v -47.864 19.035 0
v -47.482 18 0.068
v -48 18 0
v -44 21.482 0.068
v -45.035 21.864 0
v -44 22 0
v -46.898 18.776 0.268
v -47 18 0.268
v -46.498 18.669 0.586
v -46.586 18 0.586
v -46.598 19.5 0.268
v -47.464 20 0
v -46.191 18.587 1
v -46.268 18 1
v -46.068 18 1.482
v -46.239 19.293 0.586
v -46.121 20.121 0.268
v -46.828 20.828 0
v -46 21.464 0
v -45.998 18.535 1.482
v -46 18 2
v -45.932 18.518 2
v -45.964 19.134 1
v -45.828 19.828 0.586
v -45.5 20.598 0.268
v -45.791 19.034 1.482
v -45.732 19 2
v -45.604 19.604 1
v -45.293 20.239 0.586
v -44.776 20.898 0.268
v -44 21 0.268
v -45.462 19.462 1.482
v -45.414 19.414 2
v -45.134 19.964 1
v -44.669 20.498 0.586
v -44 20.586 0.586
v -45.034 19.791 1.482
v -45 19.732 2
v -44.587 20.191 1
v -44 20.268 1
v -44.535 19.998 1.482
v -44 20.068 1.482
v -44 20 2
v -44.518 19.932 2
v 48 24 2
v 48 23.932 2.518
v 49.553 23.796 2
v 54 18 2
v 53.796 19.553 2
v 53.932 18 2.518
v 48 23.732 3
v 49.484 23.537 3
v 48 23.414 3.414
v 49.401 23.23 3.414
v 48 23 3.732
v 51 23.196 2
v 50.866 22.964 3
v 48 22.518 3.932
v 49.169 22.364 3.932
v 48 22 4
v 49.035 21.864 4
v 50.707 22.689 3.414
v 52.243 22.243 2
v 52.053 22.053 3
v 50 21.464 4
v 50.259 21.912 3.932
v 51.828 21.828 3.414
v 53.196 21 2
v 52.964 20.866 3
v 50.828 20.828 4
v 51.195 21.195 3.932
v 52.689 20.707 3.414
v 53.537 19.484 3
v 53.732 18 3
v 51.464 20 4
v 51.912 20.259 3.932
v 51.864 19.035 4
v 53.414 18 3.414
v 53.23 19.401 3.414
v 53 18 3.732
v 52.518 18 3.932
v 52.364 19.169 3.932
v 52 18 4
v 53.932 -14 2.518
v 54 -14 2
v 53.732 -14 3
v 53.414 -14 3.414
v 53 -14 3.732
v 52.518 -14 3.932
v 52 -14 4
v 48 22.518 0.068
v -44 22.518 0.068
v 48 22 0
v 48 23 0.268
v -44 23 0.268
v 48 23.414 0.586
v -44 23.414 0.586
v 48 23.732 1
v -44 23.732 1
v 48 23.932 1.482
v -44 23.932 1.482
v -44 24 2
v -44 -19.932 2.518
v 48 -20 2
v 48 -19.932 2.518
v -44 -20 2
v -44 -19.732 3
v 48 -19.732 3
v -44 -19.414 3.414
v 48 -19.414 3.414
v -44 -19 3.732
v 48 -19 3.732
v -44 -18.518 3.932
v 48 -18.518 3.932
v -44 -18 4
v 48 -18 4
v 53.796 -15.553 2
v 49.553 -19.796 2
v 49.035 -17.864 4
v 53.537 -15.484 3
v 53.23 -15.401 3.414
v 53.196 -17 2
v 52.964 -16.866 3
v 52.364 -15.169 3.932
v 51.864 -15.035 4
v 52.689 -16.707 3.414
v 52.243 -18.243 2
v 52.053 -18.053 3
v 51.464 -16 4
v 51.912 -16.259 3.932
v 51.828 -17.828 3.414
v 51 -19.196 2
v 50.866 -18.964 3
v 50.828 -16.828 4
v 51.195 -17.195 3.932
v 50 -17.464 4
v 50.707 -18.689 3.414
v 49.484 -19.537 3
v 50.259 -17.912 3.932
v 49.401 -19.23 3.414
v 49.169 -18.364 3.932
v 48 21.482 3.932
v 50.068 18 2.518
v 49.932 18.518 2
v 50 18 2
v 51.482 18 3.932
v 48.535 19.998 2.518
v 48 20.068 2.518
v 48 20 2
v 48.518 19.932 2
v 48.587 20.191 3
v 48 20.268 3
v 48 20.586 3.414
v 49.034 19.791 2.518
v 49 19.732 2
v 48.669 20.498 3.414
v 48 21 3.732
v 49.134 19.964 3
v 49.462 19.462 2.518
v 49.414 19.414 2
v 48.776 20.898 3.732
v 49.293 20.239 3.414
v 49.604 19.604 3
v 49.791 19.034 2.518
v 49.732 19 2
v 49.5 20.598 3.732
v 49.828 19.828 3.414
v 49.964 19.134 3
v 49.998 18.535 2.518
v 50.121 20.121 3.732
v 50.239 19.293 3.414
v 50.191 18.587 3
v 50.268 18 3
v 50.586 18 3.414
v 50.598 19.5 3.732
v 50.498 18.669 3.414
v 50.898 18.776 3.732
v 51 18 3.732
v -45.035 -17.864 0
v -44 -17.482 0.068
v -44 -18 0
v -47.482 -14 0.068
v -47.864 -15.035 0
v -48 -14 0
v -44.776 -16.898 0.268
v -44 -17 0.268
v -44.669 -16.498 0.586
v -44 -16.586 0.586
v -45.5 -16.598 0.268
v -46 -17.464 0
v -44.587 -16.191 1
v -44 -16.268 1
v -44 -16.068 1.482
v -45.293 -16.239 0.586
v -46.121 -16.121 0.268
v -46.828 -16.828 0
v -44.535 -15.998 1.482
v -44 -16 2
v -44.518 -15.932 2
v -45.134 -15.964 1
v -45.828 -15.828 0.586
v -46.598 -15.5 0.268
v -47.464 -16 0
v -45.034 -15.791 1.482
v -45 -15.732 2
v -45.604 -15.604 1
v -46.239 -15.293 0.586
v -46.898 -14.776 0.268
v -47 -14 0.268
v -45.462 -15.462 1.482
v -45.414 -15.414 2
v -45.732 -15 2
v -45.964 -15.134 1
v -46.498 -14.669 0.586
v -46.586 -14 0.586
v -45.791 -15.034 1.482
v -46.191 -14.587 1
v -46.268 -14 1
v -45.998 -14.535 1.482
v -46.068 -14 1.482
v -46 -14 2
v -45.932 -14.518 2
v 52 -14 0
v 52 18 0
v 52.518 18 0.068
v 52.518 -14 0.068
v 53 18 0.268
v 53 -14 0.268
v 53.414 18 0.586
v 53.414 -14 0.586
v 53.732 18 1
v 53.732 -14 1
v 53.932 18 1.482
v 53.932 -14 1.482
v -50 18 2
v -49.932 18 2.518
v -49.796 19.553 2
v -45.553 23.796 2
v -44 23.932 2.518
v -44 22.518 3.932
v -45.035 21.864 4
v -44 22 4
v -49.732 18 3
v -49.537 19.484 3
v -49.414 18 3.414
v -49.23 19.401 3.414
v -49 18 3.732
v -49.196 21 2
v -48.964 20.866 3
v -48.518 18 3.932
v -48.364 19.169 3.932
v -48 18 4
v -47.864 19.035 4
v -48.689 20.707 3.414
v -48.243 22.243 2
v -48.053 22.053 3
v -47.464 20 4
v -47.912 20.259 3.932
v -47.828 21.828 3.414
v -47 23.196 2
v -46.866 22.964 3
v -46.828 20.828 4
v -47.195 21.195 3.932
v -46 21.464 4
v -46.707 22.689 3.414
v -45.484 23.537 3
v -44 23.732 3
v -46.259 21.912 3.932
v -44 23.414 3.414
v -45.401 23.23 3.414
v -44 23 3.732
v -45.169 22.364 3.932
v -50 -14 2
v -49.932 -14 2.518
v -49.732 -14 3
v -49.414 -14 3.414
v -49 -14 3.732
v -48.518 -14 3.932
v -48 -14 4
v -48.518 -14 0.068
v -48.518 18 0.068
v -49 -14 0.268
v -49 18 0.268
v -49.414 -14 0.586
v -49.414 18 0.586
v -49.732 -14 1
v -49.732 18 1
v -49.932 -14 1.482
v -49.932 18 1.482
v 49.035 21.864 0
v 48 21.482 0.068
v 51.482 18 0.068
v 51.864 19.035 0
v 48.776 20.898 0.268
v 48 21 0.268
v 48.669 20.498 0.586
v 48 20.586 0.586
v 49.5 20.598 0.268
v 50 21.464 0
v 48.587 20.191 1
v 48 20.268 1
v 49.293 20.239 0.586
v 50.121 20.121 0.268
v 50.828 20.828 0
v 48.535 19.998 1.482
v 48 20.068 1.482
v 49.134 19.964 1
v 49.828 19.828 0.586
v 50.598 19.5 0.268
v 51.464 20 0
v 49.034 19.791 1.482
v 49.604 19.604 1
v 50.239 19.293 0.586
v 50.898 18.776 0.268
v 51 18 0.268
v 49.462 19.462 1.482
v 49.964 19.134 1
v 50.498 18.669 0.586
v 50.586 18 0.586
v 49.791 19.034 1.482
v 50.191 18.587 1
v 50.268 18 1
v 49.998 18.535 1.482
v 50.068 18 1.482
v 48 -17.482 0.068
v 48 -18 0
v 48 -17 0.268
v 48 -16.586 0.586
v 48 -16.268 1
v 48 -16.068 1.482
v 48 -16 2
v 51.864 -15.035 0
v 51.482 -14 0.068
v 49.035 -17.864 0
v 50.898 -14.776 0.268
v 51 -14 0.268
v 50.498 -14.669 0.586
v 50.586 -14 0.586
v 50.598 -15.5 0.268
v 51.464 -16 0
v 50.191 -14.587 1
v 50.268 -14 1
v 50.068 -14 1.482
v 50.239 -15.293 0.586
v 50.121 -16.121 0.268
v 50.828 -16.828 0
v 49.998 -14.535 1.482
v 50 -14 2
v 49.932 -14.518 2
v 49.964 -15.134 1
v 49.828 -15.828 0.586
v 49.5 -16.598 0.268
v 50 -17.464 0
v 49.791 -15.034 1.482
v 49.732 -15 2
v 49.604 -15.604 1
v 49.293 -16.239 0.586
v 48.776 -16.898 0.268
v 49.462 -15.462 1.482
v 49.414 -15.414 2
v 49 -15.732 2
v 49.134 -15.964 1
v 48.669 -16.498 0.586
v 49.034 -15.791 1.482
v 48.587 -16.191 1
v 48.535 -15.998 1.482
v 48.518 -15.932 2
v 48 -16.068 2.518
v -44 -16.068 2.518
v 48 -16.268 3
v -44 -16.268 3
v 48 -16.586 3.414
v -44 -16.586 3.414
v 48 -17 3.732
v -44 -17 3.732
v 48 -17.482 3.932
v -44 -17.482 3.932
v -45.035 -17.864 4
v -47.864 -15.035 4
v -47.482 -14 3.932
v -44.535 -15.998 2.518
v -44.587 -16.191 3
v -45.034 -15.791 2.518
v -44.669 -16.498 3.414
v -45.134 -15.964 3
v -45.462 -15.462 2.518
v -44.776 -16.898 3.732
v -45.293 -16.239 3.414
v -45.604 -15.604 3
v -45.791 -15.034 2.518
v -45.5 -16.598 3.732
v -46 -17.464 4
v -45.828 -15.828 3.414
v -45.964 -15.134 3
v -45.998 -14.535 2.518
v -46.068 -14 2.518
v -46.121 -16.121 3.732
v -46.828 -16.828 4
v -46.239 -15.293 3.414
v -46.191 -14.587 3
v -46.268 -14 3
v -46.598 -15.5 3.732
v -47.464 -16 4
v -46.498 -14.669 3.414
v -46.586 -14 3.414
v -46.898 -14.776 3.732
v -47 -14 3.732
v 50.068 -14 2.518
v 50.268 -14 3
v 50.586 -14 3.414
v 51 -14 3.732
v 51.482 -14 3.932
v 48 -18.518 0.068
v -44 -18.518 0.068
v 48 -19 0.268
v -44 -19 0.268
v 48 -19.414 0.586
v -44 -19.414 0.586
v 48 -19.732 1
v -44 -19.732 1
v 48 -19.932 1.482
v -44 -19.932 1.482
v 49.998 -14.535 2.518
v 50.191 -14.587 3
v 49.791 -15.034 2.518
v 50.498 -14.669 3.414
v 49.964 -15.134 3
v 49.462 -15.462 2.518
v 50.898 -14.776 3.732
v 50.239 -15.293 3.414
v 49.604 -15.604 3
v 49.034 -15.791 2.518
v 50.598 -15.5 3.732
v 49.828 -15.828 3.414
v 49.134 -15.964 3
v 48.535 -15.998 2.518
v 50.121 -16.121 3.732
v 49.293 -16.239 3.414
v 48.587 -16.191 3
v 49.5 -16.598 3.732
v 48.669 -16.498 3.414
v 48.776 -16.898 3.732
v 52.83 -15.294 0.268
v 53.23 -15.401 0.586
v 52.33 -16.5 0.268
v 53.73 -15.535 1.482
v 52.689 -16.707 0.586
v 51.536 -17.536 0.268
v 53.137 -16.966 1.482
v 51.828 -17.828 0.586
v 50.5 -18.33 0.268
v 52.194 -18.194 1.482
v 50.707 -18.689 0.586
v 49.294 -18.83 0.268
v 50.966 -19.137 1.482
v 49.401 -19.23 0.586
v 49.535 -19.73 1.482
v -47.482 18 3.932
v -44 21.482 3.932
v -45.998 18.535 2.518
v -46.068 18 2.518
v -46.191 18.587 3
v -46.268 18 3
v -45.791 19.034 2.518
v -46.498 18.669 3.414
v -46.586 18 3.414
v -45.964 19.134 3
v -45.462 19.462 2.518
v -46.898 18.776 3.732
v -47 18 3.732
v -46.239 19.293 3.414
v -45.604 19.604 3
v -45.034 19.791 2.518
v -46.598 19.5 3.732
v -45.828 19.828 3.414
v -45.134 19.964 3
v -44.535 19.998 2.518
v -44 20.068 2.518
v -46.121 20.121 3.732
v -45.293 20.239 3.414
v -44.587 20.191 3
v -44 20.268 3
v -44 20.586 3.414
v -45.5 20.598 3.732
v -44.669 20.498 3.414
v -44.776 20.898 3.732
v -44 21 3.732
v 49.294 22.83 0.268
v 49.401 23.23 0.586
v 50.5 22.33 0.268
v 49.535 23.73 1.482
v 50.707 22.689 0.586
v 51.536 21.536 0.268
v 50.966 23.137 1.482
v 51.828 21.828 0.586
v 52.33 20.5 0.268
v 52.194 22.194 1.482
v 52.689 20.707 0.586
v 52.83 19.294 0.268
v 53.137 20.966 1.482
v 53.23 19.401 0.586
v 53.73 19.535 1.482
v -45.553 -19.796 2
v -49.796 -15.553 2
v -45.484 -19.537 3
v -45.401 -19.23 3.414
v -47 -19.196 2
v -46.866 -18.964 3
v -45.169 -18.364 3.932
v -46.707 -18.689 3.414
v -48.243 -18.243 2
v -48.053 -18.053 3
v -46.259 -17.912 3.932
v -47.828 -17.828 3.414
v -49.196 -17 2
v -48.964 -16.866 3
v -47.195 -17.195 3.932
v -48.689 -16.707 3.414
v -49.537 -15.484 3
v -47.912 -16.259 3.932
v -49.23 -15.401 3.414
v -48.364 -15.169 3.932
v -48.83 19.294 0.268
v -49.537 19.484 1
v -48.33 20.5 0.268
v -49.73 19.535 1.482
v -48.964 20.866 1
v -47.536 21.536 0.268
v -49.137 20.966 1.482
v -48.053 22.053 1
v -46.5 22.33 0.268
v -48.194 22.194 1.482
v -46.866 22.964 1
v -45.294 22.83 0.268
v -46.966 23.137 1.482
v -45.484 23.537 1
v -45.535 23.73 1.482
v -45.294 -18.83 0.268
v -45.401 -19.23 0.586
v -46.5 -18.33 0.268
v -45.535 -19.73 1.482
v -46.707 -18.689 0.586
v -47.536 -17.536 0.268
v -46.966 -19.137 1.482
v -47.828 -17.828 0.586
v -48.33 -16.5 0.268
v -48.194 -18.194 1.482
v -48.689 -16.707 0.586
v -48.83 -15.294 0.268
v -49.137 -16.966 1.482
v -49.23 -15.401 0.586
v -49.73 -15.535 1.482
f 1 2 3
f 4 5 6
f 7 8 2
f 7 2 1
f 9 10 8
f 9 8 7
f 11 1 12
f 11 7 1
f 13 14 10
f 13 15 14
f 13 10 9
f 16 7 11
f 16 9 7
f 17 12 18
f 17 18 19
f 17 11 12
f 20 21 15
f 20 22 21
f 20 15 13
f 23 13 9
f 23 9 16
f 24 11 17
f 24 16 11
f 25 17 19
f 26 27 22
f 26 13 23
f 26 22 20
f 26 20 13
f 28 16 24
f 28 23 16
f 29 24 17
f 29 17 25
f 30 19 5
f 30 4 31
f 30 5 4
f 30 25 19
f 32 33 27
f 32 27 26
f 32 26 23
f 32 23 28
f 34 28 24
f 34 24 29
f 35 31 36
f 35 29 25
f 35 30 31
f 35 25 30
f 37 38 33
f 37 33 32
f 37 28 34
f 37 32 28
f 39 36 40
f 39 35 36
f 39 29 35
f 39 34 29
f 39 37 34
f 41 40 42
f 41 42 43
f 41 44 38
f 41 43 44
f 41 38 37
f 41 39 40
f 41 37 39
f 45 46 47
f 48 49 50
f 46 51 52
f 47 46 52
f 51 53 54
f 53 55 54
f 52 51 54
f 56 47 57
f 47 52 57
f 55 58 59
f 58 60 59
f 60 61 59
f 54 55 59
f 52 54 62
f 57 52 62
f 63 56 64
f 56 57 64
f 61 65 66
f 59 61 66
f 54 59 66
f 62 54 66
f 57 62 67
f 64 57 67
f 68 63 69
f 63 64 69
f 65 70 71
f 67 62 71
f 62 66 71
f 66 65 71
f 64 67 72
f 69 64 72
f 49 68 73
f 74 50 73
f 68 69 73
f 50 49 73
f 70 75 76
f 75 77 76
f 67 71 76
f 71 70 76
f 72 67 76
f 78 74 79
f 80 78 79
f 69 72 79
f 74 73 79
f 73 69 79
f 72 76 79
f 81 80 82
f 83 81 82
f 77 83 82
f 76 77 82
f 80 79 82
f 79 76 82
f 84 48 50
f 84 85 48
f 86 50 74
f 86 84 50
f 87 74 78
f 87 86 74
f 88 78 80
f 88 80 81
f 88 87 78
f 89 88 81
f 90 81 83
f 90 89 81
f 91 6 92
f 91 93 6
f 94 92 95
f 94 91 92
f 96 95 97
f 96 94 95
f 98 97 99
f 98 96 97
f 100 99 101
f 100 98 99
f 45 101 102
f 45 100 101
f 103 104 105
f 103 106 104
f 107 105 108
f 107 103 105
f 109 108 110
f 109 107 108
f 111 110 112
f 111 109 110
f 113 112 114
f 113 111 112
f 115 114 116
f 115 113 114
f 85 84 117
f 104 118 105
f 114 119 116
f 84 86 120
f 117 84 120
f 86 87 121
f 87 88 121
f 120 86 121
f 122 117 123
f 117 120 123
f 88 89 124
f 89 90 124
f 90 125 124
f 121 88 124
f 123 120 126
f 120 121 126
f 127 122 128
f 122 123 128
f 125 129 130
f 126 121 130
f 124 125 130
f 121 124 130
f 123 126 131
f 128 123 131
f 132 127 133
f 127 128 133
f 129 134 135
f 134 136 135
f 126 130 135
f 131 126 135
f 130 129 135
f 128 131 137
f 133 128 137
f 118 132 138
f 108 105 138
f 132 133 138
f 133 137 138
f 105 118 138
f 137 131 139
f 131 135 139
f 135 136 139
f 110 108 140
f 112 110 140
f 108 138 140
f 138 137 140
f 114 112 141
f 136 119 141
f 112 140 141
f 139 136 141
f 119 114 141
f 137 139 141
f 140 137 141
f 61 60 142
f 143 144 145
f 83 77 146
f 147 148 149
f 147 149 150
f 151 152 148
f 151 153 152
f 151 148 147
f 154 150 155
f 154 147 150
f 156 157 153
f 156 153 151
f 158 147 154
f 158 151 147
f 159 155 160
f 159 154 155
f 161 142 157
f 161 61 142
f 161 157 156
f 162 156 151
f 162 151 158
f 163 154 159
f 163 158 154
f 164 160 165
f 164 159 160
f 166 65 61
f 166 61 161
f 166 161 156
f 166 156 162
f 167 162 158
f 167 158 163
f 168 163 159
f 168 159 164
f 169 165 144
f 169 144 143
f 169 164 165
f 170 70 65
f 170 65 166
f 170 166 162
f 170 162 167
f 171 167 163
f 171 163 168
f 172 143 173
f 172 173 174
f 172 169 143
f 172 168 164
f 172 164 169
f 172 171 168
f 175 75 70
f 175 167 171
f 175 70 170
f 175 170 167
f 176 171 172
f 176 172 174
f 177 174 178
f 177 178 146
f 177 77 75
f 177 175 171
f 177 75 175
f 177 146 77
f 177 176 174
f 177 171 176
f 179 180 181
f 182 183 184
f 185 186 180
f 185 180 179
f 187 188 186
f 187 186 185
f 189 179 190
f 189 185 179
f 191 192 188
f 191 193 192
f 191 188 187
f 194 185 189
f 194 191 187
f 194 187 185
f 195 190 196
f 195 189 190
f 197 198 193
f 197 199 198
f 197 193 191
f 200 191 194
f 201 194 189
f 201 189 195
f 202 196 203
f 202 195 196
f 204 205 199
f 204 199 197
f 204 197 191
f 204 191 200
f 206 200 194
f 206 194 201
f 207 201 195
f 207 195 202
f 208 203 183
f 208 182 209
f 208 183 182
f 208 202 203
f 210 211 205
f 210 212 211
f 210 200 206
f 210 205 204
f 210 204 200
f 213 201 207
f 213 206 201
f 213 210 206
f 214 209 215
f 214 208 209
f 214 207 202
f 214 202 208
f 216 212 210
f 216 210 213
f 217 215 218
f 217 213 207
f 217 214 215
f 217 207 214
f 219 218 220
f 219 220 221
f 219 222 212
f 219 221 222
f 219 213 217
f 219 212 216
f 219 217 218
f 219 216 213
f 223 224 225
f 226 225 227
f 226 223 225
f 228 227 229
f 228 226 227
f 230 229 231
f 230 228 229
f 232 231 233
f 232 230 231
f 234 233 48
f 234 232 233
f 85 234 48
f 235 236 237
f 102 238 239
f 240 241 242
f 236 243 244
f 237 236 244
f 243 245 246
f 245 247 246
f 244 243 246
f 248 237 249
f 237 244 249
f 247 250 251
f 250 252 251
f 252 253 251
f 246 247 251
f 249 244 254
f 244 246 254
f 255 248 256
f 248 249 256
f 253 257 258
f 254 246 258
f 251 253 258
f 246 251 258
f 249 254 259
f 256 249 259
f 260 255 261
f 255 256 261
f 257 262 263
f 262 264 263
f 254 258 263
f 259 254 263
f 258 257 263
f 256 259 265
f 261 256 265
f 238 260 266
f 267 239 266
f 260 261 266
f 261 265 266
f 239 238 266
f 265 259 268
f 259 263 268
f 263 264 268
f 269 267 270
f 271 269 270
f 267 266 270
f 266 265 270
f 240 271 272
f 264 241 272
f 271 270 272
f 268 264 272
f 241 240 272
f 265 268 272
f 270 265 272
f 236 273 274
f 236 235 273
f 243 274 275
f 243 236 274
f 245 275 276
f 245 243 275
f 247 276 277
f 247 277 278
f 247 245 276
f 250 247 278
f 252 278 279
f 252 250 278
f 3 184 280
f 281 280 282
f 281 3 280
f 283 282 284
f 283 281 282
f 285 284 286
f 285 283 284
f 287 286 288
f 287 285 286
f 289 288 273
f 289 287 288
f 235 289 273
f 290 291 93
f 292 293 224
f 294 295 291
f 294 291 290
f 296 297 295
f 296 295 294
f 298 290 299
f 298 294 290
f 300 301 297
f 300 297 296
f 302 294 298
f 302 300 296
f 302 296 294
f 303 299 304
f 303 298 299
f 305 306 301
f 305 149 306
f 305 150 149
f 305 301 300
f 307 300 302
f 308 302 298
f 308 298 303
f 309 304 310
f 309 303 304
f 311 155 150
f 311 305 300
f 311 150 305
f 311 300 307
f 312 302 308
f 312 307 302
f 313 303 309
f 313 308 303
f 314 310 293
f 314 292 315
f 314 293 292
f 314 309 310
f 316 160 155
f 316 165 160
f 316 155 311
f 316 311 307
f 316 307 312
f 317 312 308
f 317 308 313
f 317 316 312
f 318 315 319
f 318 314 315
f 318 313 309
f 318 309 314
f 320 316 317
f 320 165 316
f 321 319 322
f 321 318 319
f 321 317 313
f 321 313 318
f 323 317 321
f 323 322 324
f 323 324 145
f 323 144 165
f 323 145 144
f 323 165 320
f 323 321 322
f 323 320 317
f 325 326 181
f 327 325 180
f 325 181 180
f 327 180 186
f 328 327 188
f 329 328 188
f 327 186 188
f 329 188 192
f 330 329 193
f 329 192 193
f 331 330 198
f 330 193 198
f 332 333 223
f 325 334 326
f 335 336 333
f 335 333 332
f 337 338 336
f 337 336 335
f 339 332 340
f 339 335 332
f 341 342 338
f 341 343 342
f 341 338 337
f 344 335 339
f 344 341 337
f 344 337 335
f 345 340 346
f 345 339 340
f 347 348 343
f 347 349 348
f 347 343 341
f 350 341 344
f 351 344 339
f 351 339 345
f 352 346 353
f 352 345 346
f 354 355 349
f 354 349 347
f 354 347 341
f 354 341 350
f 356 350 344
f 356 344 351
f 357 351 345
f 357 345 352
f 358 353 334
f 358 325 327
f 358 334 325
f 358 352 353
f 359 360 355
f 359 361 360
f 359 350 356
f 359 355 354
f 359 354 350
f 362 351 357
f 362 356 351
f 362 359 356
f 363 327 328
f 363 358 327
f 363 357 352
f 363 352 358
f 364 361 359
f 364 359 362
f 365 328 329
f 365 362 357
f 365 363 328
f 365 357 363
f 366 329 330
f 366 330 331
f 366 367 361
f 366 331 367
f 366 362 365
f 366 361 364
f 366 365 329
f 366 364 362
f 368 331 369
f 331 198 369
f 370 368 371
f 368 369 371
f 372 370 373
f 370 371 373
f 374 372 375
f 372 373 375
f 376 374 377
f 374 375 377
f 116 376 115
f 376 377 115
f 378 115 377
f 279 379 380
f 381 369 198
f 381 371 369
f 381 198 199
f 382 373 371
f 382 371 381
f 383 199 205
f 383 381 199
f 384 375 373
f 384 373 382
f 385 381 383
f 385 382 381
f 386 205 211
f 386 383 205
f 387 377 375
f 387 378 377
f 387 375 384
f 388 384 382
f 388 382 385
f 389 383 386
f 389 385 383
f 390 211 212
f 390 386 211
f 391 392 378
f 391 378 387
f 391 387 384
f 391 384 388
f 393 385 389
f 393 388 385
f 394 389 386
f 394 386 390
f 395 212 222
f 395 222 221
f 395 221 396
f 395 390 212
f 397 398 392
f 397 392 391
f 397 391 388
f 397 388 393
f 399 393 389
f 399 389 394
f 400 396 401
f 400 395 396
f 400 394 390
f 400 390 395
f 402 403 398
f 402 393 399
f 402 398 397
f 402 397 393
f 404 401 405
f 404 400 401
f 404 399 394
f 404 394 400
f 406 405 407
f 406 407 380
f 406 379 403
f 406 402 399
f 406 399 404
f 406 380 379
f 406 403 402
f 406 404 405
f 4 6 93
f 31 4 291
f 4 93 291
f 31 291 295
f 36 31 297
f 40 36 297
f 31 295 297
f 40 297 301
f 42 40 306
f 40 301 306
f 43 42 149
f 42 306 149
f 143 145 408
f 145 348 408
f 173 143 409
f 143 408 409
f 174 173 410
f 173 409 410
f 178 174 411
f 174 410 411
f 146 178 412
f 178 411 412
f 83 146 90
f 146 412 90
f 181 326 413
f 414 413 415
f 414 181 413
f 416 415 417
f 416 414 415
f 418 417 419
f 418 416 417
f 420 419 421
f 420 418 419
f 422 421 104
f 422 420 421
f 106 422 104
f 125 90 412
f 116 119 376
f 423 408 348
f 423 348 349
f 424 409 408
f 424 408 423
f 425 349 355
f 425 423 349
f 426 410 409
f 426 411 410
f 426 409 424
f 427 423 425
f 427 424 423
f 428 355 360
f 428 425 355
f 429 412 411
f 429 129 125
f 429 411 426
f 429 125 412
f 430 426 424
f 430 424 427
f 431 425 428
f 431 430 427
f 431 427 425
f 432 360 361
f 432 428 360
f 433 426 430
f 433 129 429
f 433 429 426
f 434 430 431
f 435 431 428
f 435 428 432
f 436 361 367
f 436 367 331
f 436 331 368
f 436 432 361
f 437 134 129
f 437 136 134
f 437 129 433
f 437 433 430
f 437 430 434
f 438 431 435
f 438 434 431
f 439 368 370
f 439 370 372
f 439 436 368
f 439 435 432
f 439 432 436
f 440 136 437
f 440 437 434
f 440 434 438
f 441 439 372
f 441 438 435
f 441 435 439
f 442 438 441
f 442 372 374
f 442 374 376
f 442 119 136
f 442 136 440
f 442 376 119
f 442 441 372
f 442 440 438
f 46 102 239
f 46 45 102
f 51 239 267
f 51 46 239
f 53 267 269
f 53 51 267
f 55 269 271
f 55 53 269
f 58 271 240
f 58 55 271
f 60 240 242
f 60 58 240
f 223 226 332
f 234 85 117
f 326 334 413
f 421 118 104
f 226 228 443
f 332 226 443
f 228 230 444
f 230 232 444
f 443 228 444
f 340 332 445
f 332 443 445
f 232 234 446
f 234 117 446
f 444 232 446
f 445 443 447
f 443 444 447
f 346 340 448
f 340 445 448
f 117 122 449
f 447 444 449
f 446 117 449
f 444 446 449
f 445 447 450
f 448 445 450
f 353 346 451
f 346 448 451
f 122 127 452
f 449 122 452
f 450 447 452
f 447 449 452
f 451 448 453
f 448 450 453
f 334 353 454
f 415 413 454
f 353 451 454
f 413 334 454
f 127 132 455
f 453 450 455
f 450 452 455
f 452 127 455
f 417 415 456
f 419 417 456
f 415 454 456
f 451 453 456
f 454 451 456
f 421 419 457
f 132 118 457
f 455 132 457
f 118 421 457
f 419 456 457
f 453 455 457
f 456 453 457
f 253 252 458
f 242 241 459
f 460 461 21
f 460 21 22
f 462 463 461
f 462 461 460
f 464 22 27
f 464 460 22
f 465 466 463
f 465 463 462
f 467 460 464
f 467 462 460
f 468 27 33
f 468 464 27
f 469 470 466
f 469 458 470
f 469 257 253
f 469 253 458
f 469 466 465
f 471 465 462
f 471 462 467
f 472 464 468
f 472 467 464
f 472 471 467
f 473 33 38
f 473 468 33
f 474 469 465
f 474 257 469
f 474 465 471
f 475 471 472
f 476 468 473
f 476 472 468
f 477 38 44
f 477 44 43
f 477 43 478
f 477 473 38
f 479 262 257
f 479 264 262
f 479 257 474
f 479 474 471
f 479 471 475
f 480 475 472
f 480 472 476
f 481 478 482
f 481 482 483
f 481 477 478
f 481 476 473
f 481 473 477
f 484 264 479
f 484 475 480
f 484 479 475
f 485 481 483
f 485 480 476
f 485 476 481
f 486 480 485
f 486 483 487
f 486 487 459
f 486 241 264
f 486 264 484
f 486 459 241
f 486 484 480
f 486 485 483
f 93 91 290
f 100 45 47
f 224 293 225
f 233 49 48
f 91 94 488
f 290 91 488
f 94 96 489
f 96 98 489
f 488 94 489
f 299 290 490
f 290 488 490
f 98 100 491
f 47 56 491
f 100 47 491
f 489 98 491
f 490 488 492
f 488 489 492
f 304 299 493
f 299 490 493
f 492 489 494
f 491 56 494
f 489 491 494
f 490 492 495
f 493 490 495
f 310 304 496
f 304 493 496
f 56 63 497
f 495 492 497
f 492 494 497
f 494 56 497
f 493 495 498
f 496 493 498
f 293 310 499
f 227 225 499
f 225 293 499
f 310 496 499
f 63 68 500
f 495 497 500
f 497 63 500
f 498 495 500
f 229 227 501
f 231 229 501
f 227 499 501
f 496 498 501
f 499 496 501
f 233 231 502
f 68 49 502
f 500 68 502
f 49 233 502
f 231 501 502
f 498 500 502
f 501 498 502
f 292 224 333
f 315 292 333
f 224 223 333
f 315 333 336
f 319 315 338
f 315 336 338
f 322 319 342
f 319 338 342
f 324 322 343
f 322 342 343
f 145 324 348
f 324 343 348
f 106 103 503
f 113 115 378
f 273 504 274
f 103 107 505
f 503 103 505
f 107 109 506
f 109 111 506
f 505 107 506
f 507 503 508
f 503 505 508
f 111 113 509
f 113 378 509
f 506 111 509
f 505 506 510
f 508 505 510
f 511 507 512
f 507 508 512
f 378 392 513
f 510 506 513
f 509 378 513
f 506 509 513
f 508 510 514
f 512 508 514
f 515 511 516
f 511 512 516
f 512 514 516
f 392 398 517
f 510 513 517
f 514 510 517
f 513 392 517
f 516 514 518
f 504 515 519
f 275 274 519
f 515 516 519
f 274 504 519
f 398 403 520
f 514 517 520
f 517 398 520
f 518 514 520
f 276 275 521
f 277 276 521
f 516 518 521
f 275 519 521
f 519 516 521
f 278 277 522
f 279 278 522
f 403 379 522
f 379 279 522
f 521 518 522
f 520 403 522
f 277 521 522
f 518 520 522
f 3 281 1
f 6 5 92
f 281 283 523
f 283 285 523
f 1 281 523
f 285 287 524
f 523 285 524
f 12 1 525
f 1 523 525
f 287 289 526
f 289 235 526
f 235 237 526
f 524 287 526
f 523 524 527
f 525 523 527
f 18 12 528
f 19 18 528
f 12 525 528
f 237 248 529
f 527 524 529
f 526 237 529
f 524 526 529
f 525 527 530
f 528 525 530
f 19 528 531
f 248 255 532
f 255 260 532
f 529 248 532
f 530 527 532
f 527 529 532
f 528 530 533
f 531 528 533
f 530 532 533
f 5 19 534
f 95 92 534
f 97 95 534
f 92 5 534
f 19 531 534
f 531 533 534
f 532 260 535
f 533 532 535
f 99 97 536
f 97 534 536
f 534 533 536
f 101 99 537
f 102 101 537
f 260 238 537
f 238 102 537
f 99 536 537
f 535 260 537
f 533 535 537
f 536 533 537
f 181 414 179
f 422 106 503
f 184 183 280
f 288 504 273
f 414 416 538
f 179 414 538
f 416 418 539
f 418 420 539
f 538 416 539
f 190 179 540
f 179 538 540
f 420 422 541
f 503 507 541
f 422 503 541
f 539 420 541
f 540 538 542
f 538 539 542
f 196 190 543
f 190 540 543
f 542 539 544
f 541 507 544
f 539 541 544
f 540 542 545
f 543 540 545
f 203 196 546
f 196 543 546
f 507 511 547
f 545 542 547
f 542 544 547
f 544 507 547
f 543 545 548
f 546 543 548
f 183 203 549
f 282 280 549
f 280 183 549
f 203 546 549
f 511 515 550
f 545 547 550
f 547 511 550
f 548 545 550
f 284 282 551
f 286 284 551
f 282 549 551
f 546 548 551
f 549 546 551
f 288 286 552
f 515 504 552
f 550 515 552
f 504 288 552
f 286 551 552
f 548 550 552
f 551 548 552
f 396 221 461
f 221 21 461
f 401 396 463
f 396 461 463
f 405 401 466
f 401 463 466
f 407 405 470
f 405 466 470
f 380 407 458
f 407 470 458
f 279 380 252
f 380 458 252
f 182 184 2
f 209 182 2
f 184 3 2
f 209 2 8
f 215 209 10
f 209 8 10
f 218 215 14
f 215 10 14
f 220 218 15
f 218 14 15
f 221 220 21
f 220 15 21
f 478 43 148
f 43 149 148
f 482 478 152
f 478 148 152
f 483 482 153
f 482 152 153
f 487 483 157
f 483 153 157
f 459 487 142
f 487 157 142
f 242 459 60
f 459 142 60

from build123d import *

# Parameters (mm, degrees)
BOSS_EXTRUDE1_DEPTH = 4
FILLET1_R           = 2
FILLET2_R           = 2


with BuildPart() as part:
    # Sketch1 → Boss-Extrude1 (new body)
    with BuildSketch(Plane.XY):
        with BuildLine():
            Line((54, 18), (54, -14))
            ThreePointArc((54, -14), (52.242640687, -18.242640687), (48, -20))
            Line((48, -20), (-44, -20))
            ThreePointArc((-44, -20), (-48.242640687, -18.242640687), (-50, -14))
            Line((-50, -14), (-50, 18))
            ThreePointArc((-50, 18), (-48.242640687, 22.242640687), (-44, 24))
            Line((-44, 24), (48, 24))
            ThreePointArc((48, 24), (52.242640687, 22.242640687), (54, 18))
        make_face()
        with BuildLine():
            Line((50, 18), (50, -14))
            ThreePointArc((50, -14), (49.414213562, -15.414213562), (48, -16))
            Line((48, -16), (-44, -16))
            ThreePointArc((-44, -16), (-45.414213562, -15.414213562), (-46, -14))
            Line((-46, -14), (-46, 18))
            ThreePointArc((-46, 18), (-45.414213562, 19.414213562), (-44, 20))
            Line((-44, 20), (48, 20))
            ThreePointArc((48, 20), (49.414213562, 19.414213562), (50, 18))
        make_face(mode=Mode.SUBTRACT)
    extrude(amount=BOSS_EXTRUDE1_DEPTH)

    # Fillet1
    fillet1_edges = [part.edges().sort_by_distance(p)[0] for p in [
        (-48.242640687, 22.242640687, 4),
        (-50, 2, 4),
        (-48.242640687, -18.242640687, 4),
        (2, -20, 4),
        (52.242640687, -18.242640687, 4),
        (-45.414213562, 19.414213562, 4),
        (-46, 2, 4),
        (-45.414213562, -15.414213562, 4),
        (2, -16, 4),
        (49.414213562, -15.414213562, 4),
        (50, 2, 4),
        (49.414213562, 19.414213562, 4),
        (54, 2, 4),
        (2, 20, 4),
        (52.242640687, 22.242640687, 4),
        (2, 24, 4),
    ]]
    fillet(fillet1_edges, radius=FILLET1_R - 0.0001)  # a hair under: the kernel refuses the full size

    # Fillet2
    fillet2_edges = [part.edges().sort_by_distance(p)[0] for p in [
        (49.414213562, 19.414213562, 0),
        (50, 2, 0),
        (49.414213562, -15.414213562, 0),
        (2, -16, 0),
        (-45.414213562, -15.414213562, 0),
        (-46, 2, 0),
        (-45.414213562, 19.414213562, 0),
        (2, 20, 0),
        (2, 24, 0),
        (-48.242640687, 22.242640687, 0),
        (-50, 2, 0),
        (-48.242640687, -18.242640687, 0),
        (2, -20, 0),
        (52.242640687, -18.242640687, 0),
        (54, 2, 0),
        (52.242640687, 22.242640687, 0),
    ]]
    fillet(fillet2_edges, radius=FILLET2_R - 0.0001)  # a hair under: the kernel refuses the full size


solid = part.part
